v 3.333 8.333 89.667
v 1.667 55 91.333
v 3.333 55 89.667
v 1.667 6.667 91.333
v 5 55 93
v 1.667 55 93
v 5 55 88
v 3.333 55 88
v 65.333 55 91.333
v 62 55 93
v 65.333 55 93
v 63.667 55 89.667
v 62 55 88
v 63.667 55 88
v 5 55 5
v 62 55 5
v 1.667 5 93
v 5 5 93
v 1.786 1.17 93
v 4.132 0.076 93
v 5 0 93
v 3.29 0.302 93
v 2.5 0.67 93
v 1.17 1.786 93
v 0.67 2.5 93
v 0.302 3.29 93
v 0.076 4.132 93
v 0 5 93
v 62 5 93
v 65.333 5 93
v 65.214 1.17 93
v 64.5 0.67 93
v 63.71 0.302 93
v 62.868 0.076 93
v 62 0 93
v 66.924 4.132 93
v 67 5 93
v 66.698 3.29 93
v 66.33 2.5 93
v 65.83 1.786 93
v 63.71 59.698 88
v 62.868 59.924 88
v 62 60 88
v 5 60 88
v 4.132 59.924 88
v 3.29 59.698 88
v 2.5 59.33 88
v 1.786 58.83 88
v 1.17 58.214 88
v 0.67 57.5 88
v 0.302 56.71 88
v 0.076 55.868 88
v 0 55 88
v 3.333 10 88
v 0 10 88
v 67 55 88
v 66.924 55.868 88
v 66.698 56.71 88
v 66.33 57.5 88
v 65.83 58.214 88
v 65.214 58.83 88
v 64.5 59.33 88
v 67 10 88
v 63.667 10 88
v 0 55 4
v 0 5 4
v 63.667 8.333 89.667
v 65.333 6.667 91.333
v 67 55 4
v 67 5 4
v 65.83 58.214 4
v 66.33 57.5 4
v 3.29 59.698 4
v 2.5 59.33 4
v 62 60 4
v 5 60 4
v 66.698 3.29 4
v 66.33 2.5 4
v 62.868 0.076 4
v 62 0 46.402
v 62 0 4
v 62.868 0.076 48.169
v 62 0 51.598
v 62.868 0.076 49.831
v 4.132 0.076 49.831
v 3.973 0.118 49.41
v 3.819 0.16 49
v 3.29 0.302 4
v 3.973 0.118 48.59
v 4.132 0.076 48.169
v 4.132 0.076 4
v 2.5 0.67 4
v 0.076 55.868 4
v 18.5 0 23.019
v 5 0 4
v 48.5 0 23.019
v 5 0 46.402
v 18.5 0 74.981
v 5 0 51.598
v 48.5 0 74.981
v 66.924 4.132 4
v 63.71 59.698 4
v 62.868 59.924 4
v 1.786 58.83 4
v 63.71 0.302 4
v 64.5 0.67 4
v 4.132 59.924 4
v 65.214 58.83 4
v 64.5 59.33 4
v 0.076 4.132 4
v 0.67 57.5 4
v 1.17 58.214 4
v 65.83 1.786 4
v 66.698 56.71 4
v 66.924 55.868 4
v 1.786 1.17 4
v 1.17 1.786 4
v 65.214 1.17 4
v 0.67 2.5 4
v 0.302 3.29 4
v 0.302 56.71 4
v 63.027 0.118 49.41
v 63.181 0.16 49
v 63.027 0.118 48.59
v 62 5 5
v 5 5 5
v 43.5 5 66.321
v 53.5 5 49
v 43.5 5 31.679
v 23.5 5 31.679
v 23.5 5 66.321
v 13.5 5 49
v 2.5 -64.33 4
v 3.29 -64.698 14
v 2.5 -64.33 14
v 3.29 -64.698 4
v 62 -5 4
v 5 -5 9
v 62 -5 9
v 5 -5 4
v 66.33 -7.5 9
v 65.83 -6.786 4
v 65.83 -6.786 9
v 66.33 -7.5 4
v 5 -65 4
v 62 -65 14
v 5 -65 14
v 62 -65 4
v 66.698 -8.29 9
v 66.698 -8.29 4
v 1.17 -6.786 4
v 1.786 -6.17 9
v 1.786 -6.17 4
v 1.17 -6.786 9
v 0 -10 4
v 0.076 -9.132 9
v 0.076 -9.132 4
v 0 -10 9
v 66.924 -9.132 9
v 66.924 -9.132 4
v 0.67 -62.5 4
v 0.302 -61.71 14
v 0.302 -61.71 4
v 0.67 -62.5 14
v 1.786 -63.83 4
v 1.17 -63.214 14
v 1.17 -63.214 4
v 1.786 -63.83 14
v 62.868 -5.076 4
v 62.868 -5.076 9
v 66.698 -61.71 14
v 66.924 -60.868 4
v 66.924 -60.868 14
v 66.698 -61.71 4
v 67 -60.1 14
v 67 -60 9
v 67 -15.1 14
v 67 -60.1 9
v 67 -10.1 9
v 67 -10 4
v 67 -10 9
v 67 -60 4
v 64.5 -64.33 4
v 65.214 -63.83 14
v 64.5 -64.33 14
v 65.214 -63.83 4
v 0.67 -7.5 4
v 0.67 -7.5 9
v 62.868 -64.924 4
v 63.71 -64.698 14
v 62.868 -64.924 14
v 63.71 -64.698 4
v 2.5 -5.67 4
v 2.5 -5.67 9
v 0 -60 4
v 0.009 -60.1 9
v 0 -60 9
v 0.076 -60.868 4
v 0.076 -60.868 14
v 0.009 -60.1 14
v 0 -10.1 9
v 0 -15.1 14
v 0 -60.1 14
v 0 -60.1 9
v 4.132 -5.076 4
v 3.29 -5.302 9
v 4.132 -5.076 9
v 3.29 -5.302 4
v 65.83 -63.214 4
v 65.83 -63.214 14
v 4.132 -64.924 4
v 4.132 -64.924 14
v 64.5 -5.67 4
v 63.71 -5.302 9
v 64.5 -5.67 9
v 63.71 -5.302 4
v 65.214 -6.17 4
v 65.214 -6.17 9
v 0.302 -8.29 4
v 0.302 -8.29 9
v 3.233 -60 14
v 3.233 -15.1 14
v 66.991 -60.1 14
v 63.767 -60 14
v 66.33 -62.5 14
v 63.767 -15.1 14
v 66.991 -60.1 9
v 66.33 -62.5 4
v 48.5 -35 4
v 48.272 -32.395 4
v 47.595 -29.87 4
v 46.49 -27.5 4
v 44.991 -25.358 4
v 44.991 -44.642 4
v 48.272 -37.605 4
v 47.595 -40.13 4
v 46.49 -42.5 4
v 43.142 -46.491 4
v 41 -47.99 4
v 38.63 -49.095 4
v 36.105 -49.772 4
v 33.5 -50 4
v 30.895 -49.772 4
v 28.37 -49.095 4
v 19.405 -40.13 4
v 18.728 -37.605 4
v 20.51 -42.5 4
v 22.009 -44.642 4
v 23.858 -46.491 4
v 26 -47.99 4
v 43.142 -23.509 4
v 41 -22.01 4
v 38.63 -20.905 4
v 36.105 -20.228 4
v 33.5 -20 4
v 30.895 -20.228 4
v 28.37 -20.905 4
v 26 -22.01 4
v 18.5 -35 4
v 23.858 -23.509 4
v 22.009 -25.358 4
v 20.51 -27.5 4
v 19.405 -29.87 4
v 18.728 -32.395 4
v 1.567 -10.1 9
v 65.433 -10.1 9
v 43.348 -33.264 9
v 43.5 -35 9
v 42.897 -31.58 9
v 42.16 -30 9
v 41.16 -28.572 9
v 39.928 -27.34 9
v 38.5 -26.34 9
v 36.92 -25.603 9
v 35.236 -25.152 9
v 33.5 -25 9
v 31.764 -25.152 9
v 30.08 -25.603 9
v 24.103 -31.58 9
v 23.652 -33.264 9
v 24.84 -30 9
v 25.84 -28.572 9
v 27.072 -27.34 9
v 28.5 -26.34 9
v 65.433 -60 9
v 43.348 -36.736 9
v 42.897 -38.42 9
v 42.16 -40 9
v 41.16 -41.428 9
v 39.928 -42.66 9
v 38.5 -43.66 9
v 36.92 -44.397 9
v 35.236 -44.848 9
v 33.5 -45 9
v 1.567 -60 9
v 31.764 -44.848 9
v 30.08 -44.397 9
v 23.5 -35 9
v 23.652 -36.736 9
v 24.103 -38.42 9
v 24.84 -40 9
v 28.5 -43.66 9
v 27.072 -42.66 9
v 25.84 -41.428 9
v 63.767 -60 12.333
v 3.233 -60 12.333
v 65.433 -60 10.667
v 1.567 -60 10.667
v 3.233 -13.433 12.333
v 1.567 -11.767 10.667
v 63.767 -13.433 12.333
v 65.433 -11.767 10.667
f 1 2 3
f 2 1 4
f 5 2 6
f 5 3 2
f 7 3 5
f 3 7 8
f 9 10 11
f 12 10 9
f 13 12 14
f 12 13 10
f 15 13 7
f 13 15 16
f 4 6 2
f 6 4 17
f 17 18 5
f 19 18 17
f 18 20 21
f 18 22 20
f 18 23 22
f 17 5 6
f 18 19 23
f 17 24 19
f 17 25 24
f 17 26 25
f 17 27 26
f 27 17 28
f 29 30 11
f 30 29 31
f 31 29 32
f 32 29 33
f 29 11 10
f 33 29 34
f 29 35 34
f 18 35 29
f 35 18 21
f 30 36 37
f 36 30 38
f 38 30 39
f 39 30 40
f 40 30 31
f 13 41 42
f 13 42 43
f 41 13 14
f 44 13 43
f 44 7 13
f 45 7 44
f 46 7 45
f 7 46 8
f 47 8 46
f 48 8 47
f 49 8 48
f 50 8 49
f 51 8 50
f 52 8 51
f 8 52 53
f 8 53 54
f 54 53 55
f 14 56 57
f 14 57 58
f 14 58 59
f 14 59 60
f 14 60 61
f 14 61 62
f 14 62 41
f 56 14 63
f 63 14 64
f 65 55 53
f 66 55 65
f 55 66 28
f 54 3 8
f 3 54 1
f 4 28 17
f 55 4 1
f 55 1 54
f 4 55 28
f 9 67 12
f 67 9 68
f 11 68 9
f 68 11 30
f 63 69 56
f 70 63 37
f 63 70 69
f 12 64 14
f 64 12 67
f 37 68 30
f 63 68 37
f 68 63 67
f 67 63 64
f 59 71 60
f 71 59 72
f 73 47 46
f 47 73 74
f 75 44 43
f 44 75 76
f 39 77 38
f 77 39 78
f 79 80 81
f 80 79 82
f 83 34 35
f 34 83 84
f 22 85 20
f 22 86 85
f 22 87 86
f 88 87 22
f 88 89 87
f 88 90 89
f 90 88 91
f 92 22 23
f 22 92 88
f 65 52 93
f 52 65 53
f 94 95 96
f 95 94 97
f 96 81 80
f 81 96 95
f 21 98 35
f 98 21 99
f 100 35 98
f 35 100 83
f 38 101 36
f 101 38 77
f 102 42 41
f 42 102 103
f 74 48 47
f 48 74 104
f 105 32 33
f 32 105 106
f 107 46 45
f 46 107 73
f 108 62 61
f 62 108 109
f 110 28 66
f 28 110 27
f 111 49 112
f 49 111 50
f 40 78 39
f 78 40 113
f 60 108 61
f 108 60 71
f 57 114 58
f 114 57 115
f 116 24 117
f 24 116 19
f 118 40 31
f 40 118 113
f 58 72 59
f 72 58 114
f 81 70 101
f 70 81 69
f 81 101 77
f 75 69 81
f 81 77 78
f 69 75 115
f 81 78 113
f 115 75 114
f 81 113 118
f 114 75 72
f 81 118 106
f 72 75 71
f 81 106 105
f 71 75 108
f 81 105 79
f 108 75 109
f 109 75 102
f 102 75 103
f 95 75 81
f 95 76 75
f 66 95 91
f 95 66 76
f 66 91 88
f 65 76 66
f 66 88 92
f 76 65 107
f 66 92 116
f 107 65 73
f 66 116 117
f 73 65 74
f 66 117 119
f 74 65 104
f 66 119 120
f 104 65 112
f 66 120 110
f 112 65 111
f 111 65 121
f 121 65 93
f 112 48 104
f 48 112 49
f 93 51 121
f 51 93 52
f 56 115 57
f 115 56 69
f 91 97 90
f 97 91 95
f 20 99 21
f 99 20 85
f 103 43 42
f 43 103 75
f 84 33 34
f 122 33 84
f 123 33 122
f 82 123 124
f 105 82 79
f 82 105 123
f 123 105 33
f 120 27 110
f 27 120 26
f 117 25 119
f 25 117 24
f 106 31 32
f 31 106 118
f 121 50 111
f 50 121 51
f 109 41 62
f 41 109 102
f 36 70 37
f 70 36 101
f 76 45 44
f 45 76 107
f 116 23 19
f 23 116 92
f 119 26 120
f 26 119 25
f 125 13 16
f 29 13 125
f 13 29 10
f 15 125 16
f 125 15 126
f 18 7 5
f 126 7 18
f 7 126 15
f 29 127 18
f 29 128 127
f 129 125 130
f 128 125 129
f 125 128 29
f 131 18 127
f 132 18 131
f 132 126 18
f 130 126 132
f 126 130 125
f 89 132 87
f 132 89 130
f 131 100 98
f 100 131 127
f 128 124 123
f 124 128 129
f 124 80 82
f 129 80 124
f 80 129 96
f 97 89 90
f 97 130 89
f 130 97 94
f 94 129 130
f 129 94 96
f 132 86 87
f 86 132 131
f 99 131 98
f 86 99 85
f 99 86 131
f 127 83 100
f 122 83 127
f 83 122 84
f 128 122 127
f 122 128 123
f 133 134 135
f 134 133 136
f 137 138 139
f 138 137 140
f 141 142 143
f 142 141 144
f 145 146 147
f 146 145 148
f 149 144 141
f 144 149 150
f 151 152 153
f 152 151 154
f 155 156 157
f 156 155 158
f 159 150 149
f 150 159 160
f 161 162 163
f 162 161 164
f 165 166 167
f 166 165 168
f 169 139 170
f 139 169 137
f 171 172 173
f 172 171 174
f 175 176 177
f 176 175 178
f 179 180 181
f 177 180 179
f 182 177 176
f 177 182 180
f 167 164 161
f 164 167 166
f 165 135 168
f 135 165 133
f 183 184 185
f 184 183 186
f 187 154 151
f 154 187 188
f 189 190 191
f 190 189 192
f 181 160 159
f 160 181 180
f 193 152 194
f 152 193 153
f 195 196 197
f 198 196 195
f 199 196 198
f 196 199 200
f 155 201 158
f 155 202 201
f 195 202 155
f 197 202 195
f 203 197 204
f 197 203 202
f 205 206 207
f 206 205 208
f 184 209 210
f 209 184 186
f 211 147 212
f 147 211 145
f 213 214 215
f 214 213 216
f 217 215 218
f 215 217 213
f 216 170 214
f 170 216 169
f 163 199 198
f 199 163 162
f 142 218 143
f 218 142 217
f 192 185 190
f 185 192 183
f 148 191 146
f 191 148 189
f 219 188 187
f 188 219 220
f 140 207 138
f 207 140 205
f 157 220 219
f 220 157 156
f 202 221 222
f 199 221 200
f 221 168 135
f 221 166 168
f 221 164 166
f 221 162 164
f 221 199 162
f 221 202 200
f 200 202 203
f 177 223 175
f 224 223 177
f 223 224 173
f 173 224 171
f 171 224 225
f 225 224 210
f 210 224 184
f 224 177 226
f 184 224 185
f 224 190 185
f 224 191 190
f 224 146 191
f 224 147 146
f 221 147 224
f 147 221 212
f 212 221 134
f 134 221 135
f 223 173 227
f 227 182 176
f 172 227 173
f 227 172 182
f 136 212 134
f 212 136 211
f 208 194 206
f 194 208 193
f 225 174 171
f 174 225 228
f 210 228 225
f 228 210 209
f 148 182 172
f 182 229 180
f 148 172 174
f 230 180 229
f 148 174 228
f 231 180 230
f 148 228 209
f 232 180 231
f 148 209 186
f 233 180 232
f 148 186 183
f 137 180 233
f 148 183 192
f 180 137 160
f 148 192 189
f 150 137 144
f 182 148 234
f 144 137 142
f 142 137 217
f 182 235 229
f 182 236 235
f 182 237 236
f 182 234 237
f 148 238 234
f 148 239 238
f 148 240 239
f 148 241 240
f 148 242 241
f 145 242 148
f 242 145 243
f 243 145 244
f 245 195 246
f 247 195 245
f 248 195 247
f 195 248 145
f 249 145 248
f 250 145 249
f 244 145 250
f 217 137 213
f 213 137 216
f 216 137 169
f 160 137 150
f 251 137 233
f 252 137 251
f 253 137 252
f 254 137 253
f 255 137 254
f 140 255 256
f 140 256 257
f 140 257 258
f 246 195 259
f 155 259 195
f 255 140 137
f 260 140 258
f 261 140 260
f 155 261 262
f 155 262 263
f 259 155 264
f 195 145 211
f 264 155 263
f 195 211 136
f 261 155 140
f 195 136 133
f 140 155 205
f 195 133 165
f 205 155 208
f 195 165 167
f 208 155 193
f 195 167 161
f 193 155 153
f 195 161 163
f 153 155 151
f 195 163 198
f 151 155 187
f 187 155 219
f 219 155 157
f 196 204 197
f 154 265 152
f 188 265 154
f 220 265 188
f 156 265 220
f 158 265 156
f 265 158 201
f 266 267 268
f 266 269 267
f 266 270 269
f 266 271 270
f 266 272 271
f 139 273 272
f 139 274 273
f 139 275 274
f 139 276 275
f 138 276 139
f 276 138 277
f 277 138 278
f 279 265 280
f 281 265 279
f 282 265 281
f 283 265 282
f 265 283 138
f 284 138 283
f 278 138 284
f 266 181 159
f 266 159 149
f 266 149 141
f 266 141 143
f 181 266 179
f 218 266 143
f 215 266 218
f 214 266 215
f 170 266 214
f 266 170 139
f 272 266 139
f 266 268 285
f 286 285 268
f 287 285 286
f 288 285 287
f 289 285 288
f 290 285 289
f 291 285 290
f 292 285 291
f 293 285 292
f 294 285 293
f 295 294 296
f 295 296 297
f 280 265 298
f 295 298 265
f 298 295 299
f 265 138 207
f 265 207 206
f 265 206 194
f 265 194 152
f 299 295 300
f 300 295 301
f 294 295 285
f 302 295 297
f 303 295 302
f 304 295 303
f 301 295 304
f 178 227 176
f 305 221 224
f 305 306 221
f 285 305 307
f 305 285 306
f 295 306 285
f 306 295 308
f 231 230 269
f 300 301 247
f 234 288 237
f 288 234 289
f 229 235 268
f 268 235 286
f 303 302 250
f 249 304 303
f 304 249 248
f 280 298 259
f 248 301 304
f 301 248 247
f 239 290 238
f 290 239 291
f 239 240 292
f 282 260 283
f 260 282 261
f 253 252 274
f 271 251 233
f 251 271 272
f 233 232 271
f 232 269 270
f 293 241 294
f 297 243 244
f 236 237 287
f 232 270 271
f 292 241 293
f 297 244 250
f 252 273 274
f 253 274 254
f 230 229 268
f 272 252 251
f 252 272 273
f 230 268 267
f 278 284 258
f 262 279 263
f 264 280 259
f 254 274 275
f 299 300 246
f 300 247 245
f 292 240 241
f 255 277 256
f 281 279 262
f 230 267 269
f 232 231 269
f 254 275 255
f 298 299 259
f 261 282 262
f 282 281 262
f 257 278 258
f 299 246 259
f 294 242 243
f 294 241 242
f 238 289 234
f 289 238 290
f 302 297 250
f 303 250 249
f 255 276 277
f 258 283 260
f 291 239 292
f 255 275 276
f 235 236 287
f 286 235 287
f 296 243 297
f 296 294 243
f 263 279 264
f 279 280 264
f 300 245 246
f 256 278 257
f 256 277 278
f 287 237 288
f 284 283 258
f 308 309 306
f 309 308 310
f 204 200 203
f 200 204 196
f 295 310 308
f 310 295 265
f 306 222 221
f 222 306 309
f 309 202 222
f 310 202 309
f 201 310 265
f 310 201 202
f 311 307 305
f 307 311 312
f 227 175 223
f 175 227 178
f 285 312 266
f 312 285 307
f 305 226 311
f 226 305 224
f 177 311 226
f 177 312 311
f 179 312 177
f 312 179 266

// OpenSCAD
/* [Dimensions] */
// Card width
width     = 57;
// Card height
height    = 88;
// Height of the pile of cards
stackheight   = 50;

/* [Advanced] */
// Here you can set the clearance between the rails. 0.1 is recommended for a tight fit on most printers. This only affects the cover so in case you need to adjust the clearance, you only need to reprint the cover.
clearance     = 0.1;

// Shortens the object by 4 millimeters
thin_bottom   = 1; //[0:false, 1:true]

// Helps to grip. Might not look as nice.
hole_on_cover = 1; //[0:false, 1:true]

/* [Hidden] */
$fn           = 36;  // roundness of exported file
cutoutcorners = 6;   // Shape of cutout in front
thickness     = 5;   // This variable affects the thickness of every wall

module box ()
{
	difference()
	{
		if(thin_bottom)
			translate([0, 0, 4]) roundcube([width + (thickness * 2), stackheight + (thickness * 2), height + 1], thickness);
		else
			roundcube([width + (thickness * 2), stackheight + (thickness * 2), height + thickness], thickness);

		// Hollow the inside
		translate([thickness, thickness, thickness]) cube([width, stackheight, height]);

		// Rails
		translate([0, thickness, height]) rail(0);
		translate([width + thickness * 2, thickness, height]) mirror([1, 0, 0]) rail(0);

		// Rear opening
		translate([0, stackheight + thickness, height]) cube([width + (thickness * 2), thickness, thickness]);

		//front cutout
		if(width > 50 && height > 60) translate([(width/2) + thickness, 0, (height / 2) + thickness]) rotate([-90, undef]) cylinder(5, 30, 20, $fn=cutoutcorners);
		echo("rotate undef is fine :)");
	};
};

module cover (clearance)
{
	difference()
	{
		roundcube([width + (thickness * 2), stackheight + (thickness * 2), thickness * 2], thickness);
		cube([width + (thickness * 2), stackheight + thickness, thickness]);
		if(hole_on_cover) translate([(width / 2) + thickness, (stackheight / 2) + thickness, thickness]) cylinder(thickness, 10, 15);
	}
	// Rails
	translate([0, thickness]) rail(clearance);
	translate([width + (thickness * 2), thickness]) mirror([1, 0, 0]) rail(clearance);
};

module roundcube (dimensions=[1,1,1], radius=0)
{
	hull()
	{
		translate([radius, radius]) cylinder(dimensions[2], radius, radius);
		translate([dimensions[0] - radius, radius]) cylinder(dimensions[2], radius, radius);
		translate([radius, dimensions[1] - radius]) cylinder(dimensions[2], radius, radius);
		translate([dimensions[0] - radius, dimensions[1] - radius]) cylinder(dimensions[2], radius, radius);
	}
}

module rail (clearance)
{
	c=((sqrt(2) * thickness) / 3);
	translate([0, clearance]) difference()
	{
		union()
		{
			cube([(thickness / 3) - clearance, stackheight, thickness]);
			translate([(thickness / 3) - clearance, 0]) cube([(thickness / 3), stackheight, thickness/2 - (thickness / 6)]);
			intersection()
			{
				translate([-clearance, 0, thickness/2 - (thickness / 6)]) rotate([-90,-45]) cube([c, c, stackheight]);
				translate([(thickness / 3) - clearance, 0]) cube([(thickness / 3), stackheight, thickness]);
			}
		}
		rotate([45, 0]) cube(sqrt(2) * thickness, center=true);
	}
}

/* Final parts */
box();

if(thin_bottom) translate([0, -thickness, (thickness * 2) + 4]) rotate([180, 0]) cover(0.1);
else translate([0, -thickness, thickness * 2]) rotate([180, 0]) cover(0.1);
